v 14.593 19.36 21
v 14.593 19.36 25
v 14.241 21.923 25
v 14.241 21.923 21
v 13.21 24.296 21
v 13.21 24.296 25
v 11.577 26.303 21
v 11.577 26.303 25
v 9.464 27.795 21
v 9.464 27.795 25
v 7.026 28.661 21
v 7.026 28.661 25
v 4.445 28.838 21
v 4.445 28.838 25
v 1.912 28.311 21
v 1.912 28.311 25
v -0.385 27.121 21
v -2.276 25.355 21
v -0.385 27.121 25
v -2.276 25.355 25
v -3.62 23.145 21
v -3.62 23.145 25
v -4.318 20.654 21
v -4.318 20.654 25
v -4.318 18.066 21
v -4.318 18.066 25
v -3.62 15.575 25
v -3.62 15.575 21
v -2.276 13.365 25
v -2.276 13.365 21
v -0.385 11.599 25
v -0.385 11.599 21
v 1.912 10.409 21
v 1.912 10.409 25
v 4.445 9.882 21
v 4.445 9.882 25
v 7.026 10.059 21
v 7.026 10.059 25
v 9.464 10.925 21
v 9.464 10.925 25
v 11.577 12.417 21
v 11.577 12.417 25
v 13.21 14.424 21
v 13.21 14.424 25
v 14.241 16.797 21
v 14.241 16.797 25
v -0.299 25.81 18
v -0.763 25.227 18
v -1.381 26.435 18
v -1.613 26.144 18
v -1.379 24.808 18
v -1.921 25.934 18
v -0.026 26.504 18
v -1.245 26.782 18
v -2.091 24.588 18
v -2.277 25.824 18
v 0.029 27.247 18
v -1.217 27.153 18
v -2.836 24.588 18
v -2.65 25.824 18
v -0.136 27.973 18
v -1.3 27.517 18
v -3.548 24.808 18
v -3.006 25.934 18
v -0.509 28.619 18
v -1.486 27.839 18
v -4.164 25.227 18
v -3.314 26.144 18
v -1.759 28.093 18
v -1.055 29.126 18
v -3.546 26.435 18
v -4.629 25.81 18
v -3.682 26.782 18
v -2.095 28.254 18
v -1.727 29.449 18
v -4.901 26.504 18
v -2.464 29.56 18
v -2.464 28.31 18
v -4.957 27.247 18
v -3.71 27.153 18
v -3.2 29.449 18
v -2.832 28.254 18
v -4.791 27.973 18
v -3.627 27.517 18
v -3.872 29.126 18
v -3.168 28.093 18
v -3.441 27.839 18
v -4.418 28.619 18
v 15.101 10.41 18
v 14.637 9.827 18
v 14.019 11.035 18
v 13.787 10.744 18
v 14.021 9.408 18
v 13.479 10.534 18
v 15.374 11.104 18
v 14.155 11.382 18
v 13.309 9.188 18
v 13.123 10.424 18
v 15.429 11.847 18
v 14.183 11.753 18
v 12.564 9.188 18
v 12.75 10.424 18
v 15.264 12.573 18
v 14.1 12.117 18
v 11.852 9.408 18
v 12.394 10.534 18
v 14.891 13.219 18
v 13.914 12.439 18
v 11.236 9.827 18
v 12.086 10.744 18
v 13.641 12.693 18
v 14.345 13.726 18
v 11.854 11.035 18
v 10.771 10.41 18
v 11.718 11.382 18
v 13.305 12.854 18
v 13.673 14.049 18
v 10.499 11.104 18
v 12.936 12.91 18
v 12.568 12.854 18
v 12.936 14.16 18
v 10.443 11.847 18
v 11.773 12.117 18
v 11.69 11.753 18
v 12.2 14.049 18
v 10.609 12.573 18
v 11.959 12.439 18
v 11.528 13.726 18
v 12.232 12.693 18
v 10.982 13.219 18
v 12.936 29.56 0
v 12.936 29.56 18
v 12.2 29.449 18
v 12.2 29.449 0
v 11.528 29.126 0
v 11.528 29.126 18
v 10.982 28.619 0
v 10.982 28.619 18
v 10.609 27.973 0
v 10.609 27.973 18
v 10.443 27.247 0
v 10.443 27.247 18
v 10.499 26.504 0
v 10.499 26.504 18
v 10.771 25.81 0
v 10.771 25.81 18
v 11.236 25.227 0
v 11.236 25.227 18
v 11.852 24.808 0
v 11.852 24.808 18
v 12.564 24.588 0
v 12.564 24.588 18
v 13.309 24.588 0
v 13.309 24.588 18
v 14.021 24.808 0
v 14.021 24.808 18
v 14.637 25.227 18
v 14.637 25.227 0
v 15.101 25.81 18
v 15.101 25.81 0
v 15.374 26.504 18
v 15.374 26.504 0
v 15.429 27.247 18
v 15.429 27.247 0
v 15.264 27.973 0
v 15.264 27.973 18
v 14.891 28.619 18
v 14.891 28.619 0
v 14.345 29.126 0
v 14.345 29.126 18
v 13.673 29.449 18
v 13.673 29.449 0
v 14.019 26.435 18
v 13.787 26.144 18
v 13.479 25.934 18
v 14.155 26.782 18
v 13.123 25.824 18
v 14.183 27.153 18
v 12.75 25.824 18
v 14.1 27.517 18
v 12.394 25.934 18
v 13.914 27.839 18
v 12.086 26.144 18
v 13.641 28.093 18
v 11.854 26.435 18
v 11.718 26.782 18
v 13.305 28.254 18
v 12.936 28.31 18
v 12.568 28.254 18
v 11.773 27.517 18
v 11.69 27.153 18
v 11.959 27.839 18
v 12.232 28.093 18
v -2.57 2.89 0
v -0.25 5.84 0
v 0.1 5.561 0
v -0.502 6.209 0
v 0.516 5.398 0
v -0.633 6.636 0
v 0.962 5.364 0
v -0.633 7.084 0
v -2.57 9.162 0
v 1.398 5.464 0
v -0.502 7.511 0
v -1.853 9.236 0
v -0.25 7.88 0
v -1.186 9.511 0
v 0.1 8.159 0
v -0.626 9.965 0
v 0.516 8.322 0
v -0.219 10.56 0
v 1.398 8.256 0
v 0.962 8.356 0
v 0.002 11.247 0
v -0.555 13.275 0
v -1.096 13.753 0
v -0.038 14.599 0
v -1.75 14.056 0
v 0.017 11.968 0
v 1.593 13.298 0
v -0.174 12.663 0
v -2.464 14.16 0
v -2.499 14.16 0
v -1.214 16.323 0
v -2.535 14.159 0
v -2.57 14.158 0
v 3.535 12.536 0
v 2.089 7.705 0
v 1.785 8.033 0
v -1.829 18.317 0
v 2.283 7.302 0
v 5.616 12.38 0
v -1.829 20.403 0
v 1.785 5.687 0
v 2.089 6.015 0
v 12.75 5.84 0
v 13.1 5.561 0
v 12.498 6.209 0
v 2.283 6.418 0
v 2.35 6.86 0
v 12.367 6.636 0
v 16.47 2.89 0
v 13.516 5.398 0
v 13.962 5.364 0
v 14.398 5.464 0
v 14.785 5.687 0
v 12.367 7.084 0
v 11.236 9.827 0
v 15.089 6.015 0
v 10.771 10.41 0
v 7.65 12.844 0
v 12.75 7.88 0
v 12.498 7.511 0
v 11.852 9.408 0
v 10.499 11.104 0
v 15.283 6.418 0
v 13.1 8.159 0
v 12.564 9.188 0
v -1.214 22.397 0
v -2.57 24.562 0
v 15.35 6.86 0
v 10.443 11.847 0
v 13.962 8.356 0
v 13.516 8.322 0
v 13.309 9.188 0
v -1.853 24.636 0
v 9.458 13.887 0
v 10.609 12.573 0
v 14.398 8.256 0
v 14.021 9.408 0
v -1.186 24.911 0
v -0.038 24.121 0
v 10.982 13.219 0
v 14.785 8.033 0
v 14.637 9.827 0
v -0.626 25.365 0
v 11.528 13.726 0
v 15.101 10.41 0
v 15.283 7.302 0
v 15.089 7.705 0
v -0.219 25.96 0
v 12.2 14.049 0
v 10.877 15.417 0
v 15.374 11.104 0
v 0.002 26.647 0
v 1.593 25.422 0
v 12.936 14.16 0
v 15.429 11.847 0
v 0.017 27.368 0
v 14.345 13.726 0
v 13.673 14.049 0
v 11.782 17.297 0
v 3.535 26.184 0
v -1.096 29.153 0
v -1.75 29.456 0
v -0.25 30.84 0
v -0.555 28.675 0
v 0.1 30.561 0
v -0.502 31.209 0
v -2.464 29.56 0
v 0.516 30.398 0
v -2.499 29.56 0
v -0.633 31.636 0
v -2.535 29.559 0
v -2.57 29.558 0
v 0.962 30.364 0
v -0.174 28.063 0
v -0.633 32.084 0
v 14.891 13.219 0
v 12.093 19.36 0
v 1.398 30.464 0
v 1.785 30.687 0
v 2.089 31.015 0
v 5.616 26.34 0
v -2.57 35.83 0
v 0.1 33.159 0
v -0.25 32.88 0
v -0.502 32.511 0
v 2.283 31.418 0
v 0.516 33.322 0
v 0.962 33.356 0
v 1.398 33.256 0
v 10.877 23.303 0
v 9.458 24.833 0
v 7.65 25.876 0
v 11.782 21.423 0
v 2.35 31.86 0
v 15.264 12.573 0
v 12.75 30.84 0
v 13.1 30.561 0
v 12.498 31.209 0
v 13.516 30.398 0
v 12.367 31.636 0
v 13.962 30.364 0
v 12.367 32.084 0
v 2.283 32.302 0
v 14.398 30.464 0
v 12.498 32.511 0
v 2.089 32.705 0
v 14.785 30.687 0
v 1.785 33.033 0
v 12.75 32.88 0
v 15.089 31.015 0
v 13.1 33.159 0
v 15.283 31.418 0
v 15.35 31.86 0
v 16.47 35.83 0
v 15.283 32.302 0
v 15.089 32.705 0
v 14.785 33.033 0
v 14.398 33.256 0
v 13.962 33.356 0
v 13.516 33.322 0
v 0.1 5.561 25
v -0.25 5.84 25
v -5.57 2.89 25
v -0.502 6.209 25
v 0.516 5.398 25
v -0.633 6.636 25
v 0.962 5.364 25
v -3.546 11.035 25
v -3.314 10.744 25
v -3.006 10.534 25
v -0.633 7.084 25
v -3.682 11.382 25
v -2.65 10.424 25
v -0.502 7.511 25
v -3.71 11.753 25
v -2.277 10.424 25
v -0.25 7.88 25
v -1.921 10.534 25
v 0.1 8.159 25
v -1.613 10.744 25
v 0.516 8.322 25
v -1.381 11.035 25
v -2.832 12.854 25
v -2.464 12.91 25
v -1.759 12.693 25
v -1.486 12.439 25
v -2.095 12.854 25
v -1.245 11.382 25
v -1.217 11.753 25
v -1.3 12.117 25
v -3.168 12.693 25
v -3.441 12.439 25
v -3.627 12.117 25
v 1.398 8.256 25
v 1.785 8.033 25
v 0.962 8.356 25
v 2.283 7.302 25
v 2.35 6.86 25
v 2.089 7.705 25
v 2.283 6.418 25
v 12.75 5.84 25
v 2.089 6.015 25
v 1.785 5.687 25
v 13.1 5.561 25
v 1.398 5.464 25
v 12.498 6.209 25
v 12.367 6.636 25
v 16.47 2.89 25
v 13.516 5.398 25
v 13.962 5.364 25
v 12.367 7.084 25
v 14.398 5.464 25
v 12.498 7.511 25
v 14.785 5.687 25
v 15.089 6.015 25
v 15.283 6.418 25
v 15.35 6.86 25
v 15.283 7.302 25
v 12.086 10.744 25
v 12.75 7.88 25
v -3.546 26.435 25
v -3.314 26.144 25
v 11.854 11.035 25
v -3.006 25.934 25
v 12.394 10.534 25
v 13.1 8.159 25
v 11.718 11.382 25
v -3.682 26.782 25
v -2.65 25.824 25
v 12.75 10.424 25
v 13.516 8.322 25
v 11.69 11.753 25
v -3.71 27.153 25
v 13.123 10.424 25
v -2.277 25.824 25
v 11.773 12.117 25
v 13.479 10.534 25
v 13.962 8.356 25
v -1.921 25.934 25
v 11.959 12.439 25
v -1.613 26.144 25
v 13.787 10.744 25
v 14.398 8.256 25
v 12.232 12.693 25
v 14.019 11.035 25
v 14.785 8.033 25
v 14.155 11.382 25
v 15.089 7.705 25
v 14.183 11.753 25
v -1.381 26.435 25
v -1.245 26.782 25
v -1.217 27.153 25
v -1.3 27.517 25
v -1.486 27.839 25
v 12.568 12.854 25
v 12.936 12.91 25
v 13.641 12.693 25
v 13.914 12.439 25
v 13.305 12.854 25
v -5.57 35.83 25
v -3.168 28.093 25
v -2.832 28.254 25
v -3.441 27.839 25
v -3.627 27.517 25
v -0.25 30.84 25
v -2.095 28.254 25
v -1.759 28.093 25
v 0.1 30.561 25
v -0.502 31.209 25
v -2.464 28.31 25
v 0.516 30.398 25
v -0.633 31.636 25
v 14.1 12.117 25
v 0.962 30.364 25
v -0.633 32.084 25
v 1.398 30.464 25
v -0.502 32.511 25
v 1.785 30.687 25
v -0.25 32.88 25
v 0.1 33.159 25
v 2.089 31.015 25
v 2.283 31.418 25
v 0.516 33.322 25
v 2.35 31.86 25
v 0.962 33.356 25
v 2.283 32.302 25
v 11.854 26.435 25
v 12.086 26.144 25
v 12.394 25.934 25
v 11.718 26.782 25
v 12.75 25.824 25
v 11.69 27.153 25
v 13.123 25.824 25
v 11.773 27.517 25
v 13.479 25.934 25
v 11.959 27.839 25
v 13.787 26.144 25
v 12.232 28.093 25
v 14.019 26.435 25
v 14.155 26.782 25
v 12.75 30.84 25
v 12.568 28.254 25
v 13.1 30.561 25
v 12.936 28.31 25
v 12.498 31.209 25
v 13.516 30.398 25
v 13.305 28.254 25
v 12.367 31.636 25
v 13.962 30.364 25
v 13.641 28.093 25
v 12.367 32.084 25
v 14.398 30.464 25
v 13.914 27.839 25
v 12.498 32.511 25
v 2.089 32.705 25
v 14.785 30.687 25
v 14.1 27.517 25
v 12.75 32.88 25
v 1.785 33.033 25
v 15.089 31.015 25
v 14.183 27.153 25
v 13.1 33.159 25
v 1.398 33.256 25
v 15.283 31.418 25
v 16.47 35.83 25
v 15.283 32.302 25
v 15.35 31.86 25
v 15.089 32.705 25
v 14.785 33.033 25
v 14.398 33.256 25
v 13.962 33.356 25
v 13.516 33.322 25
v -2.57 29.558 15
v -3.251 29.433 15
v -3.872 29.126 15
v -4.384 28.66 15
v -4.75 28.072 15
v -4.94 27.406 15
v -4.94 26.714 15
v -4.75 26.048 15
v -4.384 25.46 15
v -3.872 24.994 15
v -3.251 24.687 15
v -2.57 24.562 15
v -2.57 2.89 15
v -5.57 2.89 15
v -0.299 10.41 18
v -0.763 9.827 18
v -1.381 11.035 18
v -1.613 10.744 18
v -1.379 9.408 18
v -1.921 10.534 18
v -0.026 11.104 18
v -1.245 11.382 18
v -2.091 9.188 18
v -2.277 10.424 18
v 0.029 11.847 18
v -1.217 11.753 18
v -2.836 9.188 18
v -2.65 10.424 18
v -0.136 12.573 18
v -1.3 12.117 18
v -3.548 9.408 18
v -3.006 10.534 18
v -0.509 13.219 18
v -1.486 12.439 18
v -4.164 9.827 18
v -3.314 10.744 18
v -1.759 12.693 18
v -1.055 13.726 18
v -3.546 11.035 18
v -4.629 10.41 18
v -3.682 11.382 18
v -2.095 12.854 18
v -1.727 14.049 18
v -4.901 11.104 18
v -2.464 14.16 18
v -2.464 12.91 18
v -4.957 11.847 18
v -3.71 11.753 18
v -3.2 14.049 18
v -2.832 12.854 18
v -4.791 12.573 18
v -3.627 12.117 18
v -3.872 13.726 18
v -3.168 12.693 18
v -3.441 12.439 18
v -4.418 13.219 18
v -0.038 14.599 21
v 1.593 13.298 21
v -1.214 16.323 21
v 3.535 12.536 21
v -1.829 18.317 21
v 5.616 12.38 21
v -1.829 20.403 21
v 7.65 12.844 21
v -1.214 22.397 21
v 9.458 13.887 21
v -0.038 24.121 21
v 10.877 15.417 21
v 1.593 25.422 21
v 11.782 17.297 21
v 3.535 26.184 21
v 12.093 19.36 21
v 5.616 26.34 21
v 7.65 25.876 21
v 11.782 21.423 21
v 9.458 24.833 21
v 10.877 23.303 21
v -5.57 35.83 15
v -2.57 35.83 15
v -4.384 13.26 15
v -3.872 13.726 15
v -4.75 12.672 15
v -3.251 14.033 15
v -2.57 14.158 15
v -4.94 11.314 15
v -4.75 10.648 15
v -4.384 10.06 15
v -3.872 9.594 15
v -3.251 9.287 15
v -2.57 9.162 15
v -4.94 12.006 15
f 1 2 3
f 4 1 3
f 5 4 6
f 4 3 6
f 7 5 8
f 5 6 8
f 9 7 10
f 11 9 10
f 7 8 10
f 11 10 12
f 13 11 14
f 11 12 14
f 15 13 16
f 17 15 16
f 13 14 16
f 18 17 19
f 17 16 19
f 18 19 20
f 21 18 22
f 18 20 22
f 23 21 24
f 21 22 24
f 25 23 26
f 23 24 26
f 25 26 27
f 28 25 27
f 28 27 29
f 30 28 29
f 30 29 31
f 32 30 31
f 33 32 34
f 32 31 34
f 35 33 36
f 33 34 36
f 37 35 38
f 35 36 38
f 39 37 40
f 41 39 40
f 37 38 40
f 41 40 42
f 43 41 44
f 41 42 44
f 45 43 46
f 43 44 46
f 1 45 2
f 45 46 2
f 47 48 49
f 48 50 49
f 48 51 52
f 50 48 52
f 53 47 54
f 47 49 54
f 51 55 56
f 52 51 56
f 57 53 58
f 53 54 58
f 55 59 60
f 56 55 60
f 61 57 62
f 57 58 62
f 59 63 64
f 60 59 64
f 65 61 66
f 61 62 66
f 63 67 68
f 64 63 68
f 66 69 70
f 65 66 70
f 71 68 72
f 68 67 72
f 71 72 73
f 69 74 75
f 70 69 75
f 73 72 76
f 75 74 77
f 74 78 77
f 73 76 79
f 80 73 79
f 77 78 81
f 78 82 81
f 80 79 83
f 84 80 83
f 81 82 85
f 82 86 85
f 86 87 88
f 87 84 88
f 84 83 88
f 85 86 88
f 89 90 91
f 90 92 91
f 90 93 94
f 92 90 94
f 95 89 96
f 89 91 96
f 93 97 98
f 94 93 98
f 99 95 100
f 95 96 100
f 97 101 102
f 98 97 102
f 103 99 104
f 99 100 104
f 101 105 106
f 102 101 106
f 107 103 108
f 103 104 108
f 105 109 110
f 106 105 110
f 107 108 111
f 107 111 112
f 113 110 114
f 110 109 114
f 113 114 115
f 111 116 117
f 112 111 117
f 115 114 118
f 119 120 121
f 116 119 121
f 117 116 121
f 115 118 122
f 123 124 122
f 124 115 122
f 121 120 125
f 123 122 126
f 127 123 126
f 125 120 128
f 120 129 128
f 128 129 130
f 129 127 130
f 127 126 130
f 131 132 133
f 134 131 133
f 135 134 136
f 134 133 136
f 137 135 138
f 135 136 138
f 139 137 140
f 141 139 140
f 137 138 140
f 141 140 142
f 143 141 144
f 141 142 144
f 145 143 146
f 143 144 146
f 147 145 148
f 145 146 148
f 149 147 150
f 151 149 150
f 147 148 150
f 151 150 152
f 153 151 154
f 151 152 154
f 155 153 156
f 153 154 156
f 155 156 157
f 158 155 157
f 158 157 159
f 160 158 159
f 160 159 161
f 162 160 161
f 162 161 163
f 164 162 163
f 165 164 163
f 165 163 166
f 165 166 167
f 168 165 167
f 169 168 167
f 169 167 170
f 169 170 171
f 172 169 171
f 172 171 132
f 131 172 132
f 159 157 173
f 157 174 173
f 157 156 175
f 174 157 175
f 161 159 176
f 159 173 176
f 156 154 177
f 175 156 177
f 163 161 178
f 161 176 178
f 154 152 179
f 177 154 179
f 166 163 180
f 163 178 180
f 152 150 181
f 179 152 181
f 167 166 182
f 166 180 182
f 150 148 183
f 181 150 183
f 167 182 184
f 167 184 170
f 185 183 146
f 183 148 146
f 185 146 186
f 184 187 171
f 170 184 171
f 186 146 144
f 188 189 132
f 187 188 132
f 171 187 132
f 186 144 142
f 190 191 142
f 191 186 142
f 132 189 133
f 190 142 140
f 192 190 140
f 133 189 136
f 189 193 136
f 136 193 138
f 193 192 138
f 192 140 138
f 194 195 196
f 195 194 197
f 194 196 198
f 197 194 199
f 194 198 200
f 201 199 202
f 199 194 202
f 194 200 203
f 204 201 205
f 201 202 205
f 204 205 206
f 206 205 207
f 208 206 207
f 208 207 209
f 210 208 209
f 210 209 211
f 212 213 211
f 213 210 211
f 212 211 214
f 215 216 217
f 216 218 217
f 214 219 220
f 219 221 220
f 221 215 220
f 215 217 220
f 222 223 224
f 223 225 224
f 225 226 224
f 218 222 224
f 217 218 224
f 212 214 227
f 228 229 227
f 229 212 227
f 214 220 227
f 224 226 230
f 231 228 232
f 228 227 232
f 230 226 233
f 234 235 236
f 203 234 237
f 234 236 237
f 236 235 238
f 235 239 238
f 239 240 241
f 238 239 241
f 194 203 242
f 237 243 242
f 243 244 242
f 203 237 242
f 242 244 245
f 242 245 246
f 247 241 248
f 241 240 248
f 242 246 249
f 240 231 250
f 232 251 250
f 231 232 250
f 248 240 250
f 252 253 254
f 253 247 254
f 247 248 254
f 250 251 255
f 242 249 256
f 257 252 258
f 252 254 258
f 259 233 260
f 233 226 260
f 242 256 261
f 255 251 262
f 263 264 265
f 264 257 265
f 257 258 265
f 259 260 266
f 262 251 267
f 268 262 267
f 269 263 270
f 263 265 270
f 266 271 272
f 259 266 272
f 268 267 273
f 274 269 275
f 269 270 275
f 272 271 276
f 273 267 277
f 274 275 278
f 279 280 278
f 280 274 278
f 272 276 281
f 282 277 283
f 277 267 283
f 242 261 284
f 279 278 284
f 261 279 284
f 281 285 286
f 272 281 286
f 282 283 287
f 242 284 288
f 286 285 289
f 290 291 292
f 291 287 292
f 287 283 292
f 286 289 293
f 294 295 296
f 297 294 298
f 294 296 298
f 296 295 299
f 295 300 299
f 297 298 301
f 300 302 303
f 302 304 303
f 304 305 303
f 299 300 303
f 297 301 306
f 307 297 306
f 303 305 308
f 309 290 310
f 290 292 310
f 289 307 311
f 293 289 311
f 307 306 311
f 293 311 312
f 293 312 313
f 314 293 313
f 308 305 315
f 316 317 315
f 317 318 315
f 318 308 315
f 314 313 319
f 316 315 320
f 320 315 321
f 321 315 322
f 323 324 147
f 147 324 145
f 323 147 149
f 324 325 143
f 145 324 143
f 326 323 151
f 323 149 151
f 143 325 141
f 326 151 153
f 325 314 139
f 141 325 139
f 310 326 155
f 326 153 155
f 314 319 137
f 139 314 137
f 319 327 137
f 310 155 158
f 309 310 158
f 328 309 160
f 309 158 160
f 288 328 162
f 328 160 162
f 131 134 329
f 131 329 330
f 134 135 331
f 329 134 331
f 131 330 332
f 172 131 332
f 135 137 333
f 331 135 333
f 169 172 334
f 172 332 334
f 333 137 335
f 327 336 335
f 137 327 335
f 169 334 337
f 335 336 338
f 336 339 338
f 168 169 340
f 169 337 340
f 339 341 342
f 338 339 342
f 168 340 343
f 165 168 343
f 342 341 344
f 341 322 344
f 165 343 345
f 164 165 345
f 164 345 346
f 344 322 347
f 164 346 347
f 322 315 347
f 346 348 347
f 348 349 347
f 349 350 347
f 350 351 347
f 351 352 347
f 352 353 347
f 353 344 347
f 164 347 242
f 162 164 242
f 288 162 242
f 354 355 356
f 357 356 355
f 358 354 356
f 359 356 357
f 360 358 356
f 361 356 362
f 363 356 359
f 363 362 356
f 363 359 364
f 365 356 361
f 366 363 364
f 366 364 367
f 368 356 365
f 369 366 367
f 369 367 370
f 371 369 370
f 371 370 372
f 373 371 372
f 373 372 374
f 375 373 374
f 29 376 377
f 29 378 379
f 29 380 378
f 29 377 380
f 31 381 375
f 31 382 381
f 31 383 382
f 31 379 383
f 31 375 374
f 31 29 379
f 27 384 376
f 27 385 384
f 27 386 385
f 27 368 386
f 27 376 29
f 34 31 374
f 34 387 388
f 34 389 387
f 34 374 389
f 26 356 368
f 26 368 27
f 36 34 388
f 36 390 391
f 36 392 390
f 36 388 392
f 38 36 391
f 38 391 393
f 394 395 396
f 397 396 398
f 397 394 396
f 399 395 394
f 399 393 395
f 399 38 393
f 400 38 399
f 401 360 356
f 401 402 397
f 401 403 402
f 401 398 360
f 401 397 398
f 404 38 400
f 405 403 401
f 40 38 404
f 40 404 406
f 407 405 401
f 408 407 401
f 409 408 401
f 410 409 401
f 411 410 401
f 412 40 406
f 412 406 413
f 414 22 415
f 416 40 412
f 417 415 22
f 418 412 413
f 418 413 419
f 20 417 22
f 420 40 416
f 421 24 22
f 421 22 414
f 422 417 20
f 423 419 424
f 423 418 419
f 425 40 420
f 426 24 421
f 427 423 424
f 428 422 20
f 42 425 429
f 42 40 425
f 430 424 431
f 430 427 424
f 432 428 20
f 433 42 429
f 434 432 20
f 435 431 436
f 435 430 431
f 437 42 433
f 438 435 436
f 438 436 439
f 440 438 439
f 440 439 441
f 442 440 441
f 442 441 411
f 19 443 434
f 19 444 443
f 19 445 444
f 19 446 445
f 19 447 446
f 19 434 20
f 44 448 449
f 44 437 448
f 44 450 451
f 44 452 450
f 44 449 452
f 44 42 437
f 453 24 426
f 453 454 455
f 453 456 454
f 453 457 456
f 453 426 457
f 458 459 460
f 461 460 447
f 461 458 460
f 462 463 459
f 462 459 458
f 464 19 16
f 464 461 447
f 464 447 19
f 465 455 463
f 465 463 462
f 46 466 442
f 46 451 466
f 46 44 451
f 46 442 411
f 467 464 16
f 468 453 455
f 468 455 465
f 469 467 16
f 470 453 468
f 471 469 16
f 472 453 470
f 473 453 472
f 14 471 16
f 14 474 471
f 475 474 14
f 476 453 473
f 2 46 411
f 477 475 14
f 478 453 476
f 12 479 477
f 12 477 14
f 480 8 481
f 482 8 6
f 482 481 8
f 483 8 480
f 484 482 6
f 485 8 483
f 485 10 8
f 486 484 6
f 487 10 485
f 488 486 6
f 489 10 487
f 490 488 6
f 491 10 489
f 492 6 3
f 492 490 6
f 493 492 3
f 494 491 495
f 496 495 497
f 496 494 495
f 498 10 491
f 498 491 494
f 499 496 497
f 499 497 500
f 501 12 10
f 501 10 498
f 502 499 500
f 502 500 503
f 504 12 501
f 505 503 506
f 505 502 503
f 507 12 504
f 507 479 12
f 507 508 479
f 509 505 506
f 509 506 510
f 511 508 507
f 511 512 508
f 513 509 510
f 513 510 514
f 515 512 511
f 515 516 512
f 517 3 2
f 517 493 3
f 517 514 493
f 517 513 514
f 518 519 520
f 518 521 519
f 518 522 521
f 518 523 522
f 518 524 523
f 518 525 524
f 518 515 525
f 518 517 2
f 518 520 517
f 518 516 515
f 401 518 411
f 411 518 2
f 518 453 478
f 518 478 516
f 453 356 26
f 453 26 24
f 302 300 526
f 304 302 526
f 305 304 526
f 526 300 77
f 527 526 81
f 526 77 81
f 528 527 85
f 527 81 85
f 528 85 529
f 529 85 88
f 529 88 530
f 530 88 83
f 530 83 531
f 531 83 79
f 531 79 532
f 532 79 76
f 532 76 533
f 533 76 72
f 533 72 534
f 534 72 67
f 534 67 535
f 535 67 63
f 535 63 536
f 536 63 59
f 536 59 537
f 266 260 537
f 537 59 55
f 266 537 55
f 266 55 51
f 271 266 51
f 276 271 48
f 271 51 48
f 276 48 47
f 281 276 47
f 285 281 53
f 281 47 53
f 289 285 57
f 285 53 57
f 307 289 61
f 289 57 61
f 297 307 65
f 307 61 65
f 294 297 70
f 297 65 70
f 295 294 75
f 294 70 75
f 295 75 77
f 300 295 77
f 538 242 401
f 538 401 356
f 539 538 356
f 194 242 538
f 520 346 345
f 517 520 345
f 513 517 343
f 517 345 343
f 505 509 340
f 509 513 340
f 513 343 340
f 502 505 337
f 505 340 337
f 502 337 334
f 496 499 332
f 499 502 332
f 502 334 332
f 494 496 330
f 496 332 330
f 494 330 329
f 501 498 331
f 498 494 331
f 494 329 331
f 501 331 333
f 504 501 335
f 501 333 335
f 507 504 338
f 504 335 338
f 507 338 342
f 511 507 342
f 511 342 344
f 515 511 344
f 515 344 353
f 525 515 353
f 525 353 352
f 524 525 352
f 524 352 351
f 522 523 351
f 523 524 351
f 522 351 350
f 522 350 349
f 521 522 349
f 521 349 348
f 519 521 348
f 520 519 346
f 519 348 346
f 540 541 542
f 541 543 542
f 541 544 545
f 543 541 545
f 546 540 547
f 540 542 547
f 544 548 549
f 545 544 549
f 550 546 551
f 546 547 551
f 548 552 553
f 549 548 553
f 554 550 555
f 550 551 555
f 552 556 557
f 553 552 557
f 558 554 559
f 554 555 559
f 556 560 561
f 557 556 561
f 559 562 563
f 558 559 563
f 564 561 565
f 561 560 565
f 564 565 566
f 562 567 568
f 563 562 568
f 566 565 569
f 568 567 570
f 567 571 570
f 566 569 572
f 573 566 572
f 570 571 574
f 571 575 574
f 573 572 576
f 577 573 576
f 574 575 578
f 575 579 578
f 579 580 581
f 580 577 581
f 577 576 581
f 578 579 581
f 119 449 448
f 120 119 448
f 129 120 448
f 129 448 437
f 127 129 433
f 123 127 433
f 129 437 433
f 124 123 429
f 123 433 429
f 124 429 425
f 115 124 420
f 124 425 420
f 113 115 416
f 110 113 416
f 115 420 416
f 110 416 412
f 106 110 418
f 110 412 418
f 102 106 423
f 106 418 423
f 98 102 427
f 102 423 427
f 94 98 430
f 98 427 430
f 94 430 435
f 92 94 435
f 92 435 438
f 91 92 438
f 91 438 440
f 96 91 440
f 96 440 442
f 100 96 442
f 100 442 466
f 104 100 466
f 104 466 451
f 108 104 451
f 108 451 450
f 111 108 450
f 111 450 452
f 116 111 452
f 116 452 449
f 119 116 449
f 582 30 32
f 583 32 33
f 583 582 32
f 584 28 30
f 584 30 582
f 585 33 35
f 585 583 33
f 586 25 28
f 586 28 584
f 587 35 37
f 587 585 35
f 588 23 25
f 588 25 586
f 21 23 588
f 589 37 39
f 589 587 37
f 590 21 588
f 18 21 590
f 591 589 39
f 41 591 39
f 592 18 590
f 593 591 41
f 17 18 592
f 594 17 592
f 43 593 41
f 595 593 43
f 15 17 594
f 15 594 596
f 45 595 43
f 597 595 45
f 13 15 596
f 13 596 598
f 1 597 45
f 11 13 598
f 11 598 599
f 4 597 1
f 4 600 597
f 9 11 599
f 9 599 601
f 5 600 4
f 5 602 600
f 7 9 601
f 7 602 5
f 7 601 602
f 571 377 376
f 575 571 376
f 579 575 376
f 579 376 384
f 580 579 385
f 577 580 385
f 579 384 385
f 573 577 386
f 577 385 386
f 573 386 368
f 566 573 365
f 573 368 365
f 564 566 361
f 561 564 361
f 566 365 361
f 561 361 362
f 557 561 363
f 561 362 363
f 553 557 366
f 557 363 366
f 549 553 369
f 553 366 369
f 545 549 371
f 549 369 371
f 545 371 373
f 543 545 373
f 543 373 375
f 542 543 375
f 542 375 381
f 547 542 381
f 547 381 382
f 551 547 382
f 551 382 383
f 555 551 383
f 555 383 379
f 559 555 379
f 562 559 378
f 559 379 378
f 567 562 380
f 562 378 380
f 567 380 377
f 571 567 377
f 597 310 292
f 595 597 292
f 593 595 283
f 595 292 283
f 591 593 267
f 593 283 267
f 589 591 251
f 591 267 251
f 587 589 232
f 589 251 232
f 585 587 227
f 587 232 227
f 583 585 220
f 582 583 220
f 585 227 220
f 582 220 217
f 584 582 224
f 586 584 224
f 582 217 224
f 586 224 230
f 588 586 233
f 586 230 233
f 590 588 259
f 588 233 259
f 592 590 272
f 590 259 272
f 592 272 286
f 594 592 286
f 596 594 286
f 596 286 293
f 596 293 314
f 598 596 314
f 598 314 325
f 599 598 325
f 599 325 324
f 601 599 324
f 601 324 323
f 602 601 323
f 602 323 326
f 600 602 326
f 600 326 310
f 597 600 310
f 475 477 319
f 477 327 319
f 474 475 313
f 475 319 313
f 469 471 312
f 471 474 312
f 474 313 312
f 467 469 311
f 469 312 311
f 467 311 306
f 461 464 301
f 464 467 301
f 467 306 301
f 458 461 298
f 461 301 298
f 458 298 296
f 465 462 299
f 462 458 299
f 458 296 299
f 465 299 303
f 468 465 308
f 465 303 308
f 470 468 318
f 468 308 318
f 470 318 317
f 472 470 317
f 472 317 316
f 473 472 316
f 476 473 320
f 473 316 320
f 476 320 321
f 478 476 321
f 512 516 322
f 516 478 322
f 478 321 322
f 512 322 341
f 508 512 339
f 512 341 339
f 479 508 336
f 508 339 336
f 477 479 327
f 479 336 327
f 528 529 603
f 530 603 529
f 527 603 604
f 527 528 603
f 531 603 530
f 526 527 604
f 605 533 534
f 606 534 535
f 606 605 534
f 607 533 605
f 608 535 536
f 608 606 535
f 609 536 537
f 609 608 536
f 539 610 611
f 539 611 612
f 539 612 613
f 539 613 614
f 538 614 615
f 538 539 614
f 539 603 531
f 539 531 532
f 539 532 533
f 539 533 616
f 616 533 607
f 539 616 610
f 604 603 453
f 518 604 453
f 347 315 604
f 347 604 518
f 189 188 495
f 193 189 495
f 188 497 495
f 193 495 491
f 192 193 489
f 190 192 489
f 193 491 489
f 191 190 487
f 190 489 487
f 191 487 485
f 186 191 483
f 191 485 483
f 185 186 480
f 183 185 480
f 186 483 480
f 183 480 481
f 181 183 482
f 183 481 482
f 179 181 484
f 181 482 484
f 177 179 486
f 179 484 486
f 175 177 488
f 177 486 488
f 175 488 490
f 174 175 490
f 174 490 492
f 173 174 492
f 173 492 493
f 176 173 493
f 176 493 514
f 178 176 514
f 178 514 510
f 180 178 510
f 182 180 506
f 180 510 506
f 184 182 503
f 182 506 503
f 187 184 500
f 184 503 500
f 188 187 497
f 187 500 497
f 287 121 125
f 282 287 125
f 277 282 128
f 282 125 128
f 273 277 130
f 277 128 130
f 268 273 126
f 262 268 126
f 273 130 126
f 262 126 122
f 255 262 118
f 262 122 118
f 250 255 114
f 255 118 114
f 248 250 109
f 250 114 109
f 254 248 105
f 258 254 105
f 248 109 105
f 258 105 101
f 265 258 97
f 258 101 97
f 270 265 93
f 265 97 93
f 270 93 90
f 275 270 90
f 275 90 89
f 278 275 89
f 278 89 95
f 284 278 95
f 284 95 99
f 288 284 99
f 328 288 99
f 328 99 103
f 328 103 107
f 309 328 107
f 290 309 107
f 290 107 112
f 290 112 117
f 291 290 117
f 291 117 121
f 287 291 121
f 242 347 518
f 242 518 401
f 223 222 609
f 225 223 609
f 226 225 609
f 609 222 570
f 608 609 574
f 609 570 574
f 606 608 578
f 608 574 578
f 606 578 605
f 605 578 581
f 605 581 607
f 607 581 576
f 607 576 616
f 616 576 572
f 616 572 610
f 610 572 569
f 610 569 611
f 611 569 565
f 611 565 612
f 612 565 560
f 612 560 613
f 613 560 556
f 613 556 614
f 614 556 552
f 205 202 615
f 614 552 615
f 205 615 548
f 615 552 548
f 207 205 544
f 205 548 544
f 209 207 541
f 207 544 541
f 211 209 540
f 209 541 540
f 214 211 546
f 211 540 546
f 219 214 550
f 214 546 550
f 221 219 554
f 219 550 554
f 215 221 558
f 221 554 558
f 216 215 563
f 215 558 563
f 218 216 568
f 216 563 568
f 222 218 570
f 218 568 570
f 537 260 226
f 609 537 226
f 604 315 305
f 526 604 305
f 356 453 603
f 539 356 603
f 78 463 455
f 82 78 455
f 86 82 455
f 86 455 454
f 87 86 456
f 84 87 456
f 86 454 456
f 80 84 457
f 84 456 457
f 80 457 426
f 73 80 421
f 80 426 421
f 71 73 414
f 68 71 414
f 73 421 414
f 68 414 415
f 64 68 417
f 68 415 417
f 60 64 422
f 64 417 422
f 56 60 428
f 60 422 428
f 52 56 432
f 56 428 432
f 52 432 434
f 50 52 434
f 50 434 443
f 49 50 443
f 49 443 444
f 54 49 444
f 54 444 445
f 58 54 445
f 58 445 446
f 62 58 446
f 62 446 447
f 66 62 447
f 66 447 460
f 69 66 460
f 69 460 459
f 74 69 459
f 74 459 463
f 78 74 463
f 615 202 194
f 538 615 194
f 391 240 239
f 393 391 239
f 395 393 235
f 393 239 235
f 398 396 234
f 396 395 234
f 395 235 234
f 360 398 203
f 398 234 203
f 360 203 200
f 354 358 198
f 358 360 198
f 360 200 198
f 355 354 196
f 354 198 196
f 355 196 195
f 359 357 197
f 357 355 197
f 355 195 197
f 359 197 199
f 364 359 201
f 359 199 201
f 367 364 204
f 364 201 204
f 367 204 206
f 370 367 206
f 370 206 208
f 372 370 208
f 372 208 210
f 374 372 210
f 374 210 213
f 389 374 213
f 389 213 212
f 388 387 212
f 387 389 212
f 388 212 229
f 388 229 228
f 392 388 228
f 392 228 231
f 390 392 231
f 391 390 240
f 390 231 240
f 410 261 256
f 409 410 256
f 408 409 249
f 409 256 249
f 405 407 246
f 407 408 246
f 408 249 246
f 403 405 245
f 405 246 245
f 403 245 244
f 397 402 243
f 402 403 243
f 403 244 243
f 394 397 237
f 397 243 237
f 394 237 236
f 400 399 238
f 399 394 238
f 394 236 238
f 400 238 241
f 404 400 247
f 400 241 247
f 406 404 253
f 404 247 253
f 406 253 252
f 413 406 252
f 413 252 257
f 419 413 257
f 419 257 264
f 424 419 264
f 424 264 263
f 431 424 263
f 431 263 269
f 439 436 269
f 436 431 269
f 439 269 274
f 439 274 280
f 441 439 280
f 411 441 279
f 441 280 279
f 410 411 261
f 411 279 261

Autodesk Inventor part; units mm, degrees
ref_plane "YZ Plane" through (0, 0, 0) normal (1, 0, 0) x (0, 1, 0)
ref_plane "XZ Plane" through (0, 0, 0) normal (0, 1, 0) x (-1, 0, 0)
ref_plane "XY Plane" through (0, 0, 0) normal (0, 0, 1) x (1, 0, 0)
ref_plane "Arbeitsebene1" through (-0.0002, 0, 0) normal (0, 0, 1) x (1, 0, 0)
sketch "Skizze1" plane through (-0.0002, 0, 0) normal (0, 0, 1) x (1, 0, 0)
  circle A0 centre (13.85, 6.86) radius 1.5 projected
  circle A1 centre (0.85, 31.86) radius 1.5 projected
  circle A2 centre (13.85, 31.86) radius 1.5 projected
  circle A3 centre (0.85, 6.86) radius 1.5 projected
  circle A4 centre (5.0933, 19.36) radius 5.5 projected
  line L0 (-3.07, 5.49) -> (-3.07, 33.23) projected
  line L1 (-3.07, 5.49) -> (-16.87, 5.49) projected
  line L2 (-16.87, 13.31) -> (-16.87, 5.49) projected
  line L3 (-16.8476, 13.31) -> (-16.87, 13.31) projected
  line L4 (-16.8476, 25.41) -> (-16.8476, 13.31) projected
  line L5 (-16.87, 25.41) -> (-16.8476, 25.41) projected
  line L6 (-16.87, 33.23) -> (-16.87, 25.41) projected
  line L7 (-3.07, 33.23) -> (-16.87, 33.23) projected
  line L8 (-16.87, 40.13) -> (-16.87, 44.21) projected
  line L9 (-20.77, 36.23) -> (-16.87, 40.13) projected
  line L10 (-24.85, 36.23) -> (-20.77, 36.23) projected
  line L11 (-24.85, 2.49) -> (-24.85, 36.23) projected
  line L12 (-20.77, 2.49) -> (-24.85, 2.49) projected
  line L13 (-16.87, -1.41) -> (-20.77, 2.49) projected
  line L14 (-16.87, -1.41) -> (-16.87, -5.49) projected
  line L15 (-16.87, -5.49) -> (16.87, -5.49) projected
  line L16 (16.87, -5.49) -> (16.87, -1.41) projected
  line L17 (20.77, 2.49) -> (16.87, -1.41) projected
  line L18 (24.85, 2.49) -> (20.77, 2.49) projected
  line L19 (24.85, 36.23) -> (24.85, 2.49) projected
  line L20 (20.77, 36.23) -> (24.85, 36.23) projected
  line L21 (16.87, 40.13) -> (20.77, 36.23) projected
  line L22 (16.87, 44.21) -> (16.87, 40.13) projected
  line L23 (-16.87, 44.21) -> (16.87, 44.21) projected
  line L24 (16.97, 36.33) -> (16.97, 2.39) projected
  line L25 (-16.97, 36.33) -> (16.97, 36.33) construction
  line L26 (-16.97, 2.39) -> (-16.97, 36.33) projected
  line L27 (16.97, 2.39) -> (-16.97, 2.39) construction
  line L28 (16.97, 2.39) -> (-16.97, 2.39) projected
  line L29 (16.47, 35.83) -> (16.47, 2.89)
  line L30 (16.47, 2.89) -> (-16.47, 2.89)
  line L31 (-16.47, 2.89) -> (-16.47, 35.83)
  line L32 (-16.47, 35.83) -> (16.47, 35.83)
  line L33 (-2.57, 35.83) -> (-2.57, 2.89)
  circle A5 centre (5.0933, 19.36) radius 7
  point P0 (0.0002, 0)
  dimension "d0" = 0.5
  dimension "d1" = 0.5
  dimension "d18" = 14
extrude "Extrusion1" add sketch "Skizze1" along normal blind 25 contours L33 L32 L29 L30
sketch "Skizze2" plane through (-2.5702, 2.89, 0) normal (0, -1, 0) x (1, 0, 0)
  line L0 (0, 0) -> (0, 25) projected
  line L1 (0, 25) -> (-3, 25)
  line L2 (-3, 25) -> (-3, 15)
  line L3 (-3, 15) -> (0, 15)
  line L4 (0, 15) -> (0, 25)
  point P0 (2.5702, 0)
  point P1 (0, 15)
  dimension "d4" = 3
  dimension "d5" = 10
extrude "Extrusion2" add sketch "Skizze2" against normal up to surface (32.94 mm away)
sketch "Skizze3" plane through (-0.0002, 0, 0) normal (0, 0, -1) x (-1, 0, 0)
  circle A0 centre (2.4634, 11.66) radius 1 projected
  circle A1 centre (-13.85, 6.86) radius 1.5 projected
  circle A2 centre (-12.9366, 27.06) radius 1 projected
  circle A3 centre (2.4634, 27.06) radius 1 projected
  circle A4 centre (-12.9366, 27.06) radius 1 projected
  arc A5 (-14.6686, 11.41) -> (-13.1866, 9.9279) centre (-12.9366, 11.66) ccw projected
  arc A6 (-13.1866, 13.3921) -> (-14.6686, 11.91) centre (-12.9366, 11.66) ccw projected
  point P0 (-0.0002, 0)
hole "Bohrung1" at (-2.4636, 11.66, 0) at (-2.4636, 27.06, 0) at (12.9364, 27.06, 0) at (12.9364, 11.66, 0) direction (0, 0, 1) diameter 2.5 end through all counterbore diameter 5 counterbore depth 18
sketch "Skizze4" plane through (-0.0002, 0, 25) normal (0, 0, 1) x (1, 0, 0)
  circle A0 centre (5.0933, 19.36) radius 5.5 projected
  circle A1 centre (5.0933, 19.36) radius 9.5
  point P0 (0.0002, 0)
  dimension "d15" = 19
extrude "Extrusion3" cut sketch "Skizze4" against normal blind 4 contours A0 | A1
properties part number "30_Cube_Z_Focus_NEMA8_captive_motorbase_v0"
